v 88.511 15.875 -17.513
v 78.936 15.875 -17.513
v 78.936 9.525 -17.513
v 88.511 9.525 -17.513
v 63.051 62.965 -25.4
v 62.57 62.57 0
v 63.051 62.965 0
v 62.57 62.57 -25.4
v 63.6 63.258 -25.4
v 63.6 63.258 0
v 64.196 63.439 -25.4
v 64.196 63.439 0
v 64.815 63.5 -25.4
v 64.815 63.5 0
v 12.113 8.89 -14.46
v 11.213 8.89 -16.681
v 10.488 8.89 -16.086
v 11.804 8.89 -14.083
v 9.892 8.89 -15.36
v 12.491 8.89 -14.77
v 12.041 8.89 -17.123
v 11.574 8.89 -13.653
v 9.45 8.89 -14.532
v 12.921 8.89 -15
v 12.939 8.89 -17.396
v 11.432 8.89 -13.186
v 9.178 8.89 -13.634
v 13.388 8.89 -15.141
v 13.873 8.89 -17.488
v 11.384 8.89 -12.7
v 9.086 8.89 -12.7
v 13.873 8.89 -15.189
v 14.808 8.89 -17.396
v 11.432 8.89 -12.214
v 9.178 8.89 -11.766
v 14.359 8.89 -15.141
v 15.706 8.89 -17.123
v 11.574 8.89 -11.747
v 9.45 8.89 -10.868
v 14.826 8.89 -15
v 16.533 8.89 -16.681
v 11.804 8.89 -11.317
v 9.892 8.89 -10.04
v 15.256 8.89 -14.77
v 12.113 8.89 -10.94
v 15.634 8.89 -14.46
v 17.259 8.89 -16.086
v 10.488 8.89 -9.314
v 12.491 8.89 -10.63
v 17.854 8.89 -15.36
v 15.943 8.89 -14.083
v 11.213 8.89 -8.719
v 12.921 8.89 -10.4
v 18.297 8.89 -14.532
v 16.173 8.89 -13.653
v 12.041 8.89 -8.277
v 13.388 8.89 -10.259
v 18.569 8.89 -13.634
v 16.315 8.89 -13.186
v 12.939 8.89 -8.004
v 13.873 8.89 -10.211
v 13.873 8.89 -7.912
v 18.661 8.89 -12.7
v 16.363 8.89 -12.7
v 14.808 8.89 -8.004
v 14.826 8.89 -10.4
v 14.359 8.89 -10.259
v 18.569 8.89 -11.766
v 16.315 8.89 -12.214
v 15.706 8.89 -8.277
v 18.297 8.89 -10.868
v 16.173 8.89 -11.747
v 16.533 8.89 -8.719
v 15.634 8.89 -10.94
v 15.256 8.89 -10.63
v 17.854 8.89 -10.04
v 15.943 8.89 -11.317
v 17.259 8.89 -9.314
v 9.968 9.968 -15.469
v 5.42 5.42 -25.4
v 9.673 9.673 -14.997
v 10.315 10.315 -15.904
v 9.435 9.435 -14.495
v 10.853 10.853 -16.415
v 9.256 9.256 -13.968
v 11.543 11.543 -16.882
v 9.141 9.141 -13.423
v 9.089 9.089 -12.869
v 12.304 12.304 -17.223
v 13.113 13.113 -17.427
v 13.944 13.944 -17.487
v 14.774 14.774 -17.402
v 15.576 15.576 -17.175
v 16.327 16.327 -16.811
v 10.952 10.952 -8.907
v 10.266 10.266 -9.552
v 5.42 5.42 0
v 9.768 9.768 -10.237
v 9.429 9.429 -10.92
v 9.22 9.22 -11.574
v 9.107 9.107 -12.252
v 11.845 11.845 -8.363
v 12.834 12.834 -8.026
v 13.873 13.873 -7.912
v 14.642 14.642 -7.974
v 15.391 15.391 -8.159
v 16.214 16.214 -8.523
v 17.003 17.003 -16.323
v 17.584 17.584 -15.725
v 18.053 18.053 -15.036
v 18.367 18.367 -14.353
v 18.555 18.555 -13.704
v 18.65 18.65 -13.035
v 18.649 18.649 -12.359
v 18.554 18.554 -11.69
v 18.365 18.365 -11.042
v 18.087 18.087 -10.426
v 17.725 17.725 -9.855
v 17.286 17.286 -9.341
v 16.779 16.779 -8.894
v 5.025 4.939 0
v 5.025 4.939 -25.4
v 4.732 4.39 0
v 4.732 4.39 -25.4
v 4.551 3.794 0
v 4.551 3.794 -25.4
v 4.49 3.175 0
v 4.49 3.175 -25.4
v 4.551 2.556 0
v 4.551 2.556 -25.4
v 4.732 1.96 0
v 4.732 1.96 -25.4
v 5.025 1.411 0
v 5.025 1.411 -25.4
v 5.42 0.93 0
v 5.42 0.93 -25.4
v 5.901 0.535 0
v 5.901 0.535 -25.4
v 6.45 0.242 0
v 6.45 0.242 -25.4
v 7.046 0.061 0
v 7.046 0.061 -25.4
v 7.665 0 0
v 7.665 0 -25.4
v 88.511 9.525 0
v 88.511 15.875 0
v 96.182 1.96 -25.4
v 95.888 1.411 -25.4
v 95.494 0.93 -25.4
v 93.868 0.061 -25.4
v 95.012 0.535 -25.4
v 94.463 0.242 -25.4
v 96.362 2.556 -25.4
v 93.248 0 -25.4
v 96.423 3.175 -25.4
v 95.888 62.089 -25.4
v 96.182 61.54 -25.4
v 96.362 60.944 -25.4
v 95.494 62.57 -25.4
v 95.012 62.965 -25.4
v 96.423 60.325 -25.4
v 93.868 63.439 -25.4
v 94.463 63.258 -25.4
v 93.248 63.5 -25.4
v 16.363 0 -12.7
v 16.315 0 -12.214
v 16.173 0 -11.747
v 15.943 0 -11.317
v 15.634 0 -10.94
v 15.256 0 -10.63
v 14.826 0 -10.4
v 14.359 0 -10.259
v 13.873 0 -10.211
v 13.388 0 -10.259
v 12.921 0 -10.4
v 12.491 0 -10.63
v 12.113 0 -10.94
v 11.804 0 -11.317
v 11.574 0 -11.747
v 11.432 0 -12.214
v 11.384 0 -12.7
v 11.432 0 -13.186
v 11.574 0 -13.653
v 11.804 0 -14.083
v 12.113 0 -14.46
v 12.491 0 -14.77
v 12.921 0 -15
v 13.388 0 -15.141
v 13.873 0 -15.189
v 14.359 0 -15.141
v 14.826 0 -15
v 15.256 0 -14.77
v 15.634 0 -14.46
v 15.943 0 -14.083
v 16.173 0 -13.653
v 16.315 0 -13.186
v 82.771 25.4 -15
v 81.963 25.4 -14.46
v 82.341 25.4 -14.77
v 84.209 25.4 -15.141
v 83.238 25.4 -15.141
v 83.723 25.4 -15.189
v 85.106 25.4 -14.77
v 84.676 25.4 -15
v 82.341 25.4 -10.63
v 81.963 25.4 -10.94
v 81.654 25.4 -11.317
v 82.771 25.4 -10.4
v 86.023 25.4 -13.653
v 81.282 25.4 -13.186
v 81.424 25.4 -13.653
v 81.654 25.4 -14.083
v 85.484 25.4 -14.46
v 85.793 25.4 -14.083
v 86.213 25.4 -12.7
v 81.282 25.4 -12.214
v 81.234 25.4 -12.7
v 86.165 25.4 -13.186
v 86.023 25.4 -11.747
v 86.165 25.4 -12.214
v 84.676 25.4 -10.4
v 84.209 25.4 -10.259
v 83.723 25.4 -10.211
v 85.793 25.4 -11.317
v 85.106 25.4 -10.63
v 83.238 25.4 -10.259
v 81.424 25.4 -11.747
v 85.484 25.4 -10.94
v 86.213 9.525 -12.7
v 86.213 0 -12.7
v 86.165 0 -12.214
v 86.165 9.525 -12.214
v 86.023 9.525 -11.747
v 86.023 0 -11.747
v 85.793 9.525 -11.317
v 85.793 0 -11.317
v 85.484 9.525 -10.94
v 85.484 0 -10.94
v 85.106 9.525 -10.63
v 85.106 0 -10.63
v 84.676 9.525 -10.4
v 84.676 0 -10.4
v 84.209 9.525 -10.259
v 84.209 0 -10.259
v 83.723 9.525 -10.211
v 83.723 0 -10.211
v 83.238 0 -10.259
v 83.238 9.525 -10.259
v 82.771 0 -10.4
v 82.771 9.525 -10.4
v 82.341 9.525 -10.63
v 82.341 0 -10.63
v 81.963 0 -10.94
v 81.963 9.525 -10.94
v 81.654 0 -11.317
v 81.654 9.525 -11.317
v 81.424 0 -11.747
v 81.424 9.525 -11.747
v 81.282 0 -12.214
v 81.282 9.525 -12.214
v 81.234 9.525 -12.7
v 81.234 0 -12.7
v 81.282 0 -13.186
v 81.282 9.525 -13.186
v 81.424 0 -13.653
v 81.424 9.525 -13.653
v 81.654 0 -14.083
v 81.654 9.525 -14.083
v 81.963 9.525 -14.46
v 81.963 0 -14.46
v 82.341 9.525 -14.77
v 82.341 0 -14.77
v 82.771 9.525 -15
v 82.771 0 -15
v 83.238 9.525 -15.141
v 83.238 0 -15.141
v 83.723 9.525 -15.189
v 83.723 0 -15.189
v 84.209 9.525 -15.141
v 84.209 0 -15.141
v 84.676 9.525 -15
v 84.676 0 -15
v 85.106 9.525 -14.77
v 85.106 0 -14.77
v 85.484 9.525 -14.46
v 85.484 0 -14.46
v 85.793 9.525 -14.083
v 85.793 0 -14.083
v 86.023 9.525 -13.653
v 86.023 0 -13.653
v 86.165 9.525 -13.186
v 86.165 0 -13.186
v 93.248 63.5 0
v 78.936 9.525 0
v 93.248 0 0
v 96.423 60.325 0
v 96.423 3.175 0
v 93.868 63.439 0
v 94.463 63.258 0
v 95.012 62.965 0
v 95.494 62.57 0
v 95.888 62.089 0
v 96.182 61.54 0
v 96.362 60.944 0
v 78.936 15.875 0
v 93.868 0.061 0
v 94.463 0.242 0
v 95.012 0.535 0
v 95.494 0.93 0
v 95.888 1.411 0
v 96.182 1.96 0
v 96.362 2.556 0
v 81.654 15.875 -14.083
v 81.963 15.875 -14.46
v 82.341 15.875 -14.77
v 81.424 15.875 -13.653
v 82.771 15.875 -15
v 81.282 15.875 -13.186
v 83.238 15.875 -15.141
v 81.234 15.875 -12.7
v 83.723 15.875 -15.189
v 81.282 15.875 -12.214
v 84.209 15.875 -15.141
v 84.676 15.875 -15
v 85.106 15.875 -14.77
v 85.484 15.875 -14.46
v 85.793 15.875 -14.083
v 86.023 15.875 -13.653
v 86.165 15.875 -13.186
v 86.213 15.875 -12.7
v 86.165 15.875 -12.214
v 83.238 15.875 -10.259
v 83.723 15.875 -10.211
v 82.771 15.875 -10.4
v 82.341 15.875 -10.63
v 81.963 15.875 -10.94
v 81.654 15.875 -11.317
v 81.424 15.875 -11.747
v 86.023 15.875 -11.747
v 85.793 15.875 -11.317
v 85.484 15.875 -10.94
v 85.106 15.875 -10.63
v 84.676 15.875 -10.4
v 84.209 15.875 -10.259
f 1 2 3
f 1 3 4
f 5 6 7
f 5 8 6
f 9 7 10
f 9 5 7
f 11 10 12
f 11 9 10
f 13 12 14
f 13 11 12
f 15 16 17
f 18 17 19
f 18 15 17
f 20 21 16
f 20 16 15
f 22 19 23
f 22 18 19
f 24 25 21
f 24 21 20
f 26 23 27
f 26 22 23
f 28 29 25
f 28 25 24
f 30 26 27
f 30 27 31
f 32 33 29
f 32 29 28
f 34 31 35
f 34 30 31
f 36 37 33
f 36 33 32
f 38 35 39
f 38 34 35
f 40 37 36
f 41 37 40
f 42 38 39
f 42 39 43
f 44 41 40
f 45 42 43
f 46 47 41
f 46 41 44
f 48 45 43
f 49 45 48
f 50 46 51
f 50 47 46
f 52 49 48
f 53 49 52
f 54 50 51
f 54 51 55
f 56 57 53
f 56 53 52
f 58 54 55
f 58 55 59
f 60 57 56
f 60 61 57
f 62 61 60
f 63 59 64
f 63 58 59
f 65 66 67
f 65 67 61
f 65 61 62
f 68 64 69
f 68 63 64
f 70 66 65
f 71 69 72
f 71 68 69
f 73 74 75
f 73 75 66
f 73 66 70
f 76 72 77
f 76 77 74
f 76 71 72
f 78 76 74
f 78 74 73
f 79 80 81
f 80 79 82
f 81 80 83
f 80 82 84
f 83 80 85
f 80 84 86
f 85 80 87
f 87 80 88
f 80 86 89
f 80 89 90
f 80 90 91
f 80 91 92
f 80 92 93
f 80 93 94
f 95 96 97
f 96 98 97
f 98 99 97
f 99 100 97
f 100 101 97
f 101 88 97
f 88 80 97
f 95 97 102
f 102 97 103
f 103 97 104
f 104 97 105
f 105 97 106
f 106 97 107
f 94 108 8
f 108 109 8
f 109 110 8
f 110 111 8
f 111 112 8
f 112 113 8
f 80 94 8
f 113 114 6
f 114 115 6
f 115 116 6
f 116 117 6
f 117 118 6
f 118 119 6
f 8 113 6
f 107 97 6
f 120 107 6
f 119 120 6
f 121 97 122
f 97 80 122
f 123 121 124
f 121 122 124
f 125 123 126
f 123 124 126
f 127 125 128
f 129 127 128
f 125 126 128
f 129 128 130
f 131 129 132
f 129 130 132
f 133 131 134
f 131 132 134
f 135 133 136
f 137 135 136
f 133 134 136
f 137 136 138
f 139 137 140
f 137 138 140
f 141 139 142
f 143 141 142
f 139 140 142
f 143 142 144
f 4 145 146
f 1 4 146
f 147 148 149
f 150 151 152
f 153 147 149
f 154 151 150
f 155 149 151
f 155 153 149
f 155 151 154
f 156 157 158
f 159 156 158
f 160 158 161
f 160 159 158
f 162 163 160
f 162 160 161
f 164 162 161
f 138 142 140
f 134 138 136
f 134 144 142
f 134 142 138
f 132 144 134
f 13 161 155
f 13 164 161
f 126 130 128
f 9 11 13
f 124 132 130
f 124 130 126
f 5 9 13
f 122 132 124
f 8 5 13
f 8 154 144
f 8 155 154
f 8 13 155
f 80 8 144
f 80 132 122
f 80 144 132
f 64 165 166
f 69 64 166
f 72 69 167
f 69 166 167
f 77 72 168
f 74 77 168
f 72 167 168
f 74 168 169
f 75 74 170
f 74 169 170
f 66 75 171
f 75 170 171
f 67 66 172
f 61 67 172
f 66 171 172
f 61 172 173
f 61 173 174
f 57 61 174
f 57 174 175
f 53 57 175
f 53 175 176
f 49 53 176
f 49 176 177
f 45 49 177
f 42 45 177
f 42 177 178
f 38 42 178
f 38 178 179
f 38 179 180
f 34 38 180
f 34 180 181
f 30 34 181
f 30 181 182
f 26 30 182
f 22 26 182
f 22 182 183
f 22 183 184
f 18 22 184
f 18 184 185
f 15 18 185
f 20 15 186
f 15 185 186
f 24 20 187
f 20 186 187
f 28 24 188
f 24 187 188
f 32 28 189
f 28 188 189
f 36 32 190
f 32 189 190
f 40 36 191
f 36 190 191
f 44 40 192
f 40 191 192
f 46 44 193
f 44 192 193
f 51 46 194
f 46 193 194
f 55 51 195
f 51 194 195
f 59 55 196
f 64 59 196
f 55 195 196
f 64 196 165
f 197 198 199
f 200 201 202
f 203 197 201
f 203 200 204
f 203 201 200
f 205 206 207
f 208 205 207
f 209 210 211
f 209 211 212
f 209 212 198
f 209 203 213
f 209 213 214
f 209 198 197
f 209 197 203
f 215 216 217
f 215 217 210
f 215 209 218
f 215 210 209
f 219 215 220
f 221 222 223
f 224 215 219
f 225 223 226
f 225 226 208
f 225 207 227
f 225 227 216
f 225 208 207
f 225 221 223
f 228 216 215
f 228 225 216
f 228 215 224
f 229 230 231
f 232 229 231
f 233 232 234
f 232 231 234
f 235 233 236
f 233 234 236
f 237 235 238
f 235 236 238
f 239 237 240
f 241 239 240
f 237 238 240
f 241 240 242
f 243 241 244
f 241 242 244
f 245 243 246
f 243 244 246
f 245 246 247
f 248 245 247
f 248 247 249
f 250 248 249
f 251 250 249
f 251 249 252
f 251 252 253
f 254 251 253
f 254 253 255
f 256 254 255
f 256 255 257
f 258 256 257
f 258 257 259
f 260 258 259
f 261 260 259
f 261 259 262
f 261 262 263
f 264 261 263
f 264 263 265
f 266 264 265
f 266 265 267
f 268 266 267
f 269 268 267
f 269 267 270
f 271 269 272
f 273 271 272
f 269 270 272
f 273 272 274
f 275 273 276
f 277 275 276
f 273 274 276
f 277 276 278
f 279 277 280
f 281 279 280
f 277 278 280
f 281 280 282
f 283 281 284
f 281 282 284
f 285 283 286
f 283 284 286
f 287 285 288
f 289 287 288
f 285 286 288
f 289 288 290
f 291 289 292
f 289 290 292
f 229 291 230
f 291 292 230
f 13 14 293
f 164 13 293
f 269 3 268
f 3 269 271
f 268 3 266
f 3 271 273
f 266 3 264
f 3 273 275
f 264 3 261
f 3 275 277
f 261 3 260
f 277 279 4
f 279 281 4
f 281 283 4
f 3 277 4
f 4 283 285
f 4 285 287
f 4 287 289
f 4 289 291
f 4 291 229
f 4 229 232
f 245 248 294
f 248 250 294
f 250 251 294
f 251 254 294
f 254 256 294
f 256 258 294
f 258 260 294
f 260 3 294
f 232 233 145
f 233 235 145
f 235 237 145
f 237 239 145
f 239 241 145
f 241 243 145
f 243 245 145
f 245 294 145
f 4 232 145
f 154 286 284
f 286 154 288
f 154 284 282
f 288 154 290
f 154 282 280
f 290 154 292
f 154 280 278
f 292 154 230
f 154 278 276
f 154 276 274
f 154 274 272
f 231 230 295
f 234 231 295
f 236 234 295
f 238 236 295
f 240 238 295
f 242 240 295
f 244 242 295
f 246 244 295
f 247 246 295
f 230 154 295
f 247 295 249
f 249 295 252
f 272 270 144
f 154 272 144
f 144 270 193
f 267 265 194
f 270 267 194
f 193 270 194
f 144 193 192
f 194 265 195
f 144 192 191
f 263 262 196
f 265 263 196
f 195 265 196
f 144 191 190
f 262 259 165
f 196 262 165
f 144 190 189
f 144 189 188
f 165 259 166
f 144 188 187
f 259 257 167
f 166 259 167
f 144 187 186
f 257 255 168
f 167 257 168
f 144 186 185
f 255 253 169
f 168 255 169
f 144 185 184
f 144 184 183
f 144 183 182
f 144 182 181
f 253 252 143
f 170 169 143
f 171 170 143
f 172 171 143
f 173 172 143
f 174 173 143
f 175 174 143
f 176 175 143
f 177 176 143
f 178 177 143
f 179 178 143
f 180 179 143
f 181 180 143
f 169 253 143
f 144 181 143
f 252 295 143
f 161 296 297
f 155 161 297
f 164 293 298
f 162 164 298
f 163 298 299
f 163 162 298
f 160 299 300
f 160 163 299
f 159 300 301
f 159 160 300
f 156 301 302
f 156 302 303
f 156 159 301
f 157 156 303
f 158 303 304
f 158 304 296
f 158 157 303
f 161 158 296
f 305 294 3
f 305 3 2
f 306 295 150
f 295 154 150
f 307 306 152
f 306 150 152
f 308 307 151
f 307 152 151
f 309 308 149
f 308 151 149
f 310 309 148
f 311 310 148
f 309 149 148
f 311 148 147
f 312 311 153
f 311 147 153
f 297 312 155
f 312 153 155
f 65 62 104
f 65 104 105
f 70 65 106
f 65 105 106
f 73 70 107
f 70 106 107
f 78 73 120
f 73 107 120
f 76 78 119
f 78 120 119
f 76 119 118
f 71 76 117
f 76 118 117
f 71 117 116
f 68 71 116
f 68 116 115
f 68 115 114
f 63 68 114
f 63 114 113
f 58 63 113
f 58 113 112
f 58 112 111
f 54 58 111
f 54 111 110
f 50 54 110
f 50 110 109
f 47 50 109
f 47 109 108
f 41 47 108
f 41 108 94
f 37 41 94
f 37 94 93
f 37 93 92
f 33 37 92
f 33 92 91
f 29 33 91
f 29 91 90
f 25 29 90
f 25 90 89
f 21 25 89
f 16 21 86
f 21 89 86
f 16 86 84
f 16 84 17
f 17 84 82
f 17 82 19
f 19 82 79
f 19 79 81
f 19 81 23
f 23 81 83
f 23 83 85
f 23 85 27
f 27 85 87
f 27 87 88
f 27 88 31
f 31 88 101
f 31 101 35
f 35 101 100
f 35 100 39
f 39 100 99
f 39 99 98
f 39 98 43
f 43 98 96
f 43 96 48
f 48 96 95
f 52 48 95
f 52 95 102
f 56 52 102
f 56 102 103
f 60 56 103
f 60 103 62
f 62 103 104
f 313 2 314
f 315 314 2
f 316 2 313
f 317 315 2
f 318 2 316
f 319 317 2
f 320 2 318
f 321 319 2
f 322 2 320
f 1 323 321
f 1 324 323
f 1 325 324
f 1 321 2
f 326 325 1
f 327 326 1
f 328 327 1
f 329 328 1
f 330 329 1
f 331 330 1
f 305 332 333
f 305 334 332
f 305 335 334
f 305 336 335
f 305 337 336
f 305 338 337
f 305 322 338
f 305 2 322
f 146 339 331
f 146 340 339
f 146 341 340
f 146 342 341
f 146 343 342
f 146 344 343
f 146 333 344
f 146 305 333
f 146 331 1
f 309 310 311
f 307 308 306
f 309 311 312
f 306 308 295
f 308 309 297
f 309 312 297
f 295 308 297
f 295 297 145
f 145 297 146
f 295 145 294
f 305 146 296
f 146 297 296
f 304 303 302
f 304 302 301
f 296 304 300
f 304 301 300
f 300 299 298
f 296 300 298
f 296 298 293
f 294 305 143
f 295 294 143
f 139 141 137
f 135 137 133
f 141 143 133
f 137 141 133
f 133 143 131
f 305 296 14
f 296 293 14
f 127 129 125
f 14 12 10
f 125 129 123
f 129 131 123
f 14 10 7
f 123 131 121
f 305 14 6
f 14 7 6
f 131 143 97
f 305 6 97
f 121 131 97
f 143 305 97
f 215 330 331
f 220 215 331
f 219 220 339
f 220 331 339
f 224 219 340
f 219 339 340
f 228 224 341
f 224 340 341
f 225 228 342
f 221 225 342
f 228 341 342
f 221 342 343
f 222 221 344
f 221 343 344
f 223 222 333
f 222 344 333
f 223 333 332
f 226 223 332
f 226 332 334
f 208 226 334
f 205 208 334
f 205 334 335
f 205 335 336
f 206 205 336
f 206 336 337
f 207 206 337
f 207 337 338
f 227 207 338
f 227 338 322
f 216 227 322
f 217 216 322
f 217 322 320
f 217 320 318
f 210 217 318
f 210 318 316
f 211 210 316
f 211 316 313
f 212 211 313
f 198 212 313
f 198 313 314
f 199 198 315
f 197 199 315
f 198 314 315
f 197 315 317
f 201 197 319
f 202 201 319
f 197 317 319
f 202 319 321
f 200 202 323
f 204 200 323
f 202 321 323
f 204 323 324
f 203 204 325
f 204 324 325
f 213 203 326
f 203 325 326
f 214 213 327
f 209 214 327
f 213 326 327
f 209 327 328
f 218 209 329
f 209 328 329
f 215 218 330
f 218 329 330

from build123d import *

# Parameters (mm, degrees)
BOSS_EXTRUDE1_DEPTH = 25.4
SKETCH3_R           = 2.4892
CUT_EXTRUDE1_DEPTH  = 25.4
SKETCH5_W           = 9.5758
SKETCH5_H           = 6.35
CUT_EXTRUDE2_DEPTH  = 17.5133
SKETCH7_R           = 4.7879
CUT_EXTRUDE3_DEPTH  = 54.61
FILLET3_R           = 3.175


with BuildPart() as part:
    # Sketch1 → Boss-Extrude1 (new body)
    with BuildSketch(Plane.XY):
        Polygon((0, 0), (63.5, 63.5), (96.42348, 63.5), (96.42348, 0), align=None)
    extrude(amount=-BOSS_EXTRUDE1_DEPTH)

    # Sketch3 → Cut-Extrude1 (cut)
    with BuildSketch(Plane.XZ):
        with Locations((83.72348, -12.7)):
            Circle(SKETCH3_R)
        with Locations((13.87348, -12.7)):
            Circle(SKETCH3_R)
    extrude(amount=-CUT_EXTRUDE1_DEPTH, mode=Mode.SUBTRACT)

    # Sketch5 → Cut-Extrude2 (cut)
    with BuildSketch(Plane.XY):
        with Locations((83.72348, 12.7)):
            Rectangle(SKETCH5_W, SKETCH5_H)
    extrude(amount=-CUT_EXTRUDE2_DEPTH, mode=Mode.SUBTRACT)

    # Sketch7 → Cut-Extrude3 (cut)
    with BuildSketch(Plane(origin=(0, 63.5, 0), x_dir=(1, 0, 0), z_dir=(0, 1, 0))):
        with Locations(Location((13.87348, 12.7, 0), (0, 0, 270))):
            Circle(SKETCH7_R)
    extrude(amount=-CUT_EXTRUDE3_DEPTH, mode=Mode.SUBTRACT)

    # Fillet3
    fillet3_edges = [part.edges().sort_by_distance(p)[0] for p in [
        (0, 0, -12.7),
        (63.5, 63.5, -12.7),
        (96.42348, 63.5, -12.7),
        (96.42348, 0, -12.7),
    ]]
    fillet(fillet3_edges, radius=FILLET3_R)


solid = part.part
